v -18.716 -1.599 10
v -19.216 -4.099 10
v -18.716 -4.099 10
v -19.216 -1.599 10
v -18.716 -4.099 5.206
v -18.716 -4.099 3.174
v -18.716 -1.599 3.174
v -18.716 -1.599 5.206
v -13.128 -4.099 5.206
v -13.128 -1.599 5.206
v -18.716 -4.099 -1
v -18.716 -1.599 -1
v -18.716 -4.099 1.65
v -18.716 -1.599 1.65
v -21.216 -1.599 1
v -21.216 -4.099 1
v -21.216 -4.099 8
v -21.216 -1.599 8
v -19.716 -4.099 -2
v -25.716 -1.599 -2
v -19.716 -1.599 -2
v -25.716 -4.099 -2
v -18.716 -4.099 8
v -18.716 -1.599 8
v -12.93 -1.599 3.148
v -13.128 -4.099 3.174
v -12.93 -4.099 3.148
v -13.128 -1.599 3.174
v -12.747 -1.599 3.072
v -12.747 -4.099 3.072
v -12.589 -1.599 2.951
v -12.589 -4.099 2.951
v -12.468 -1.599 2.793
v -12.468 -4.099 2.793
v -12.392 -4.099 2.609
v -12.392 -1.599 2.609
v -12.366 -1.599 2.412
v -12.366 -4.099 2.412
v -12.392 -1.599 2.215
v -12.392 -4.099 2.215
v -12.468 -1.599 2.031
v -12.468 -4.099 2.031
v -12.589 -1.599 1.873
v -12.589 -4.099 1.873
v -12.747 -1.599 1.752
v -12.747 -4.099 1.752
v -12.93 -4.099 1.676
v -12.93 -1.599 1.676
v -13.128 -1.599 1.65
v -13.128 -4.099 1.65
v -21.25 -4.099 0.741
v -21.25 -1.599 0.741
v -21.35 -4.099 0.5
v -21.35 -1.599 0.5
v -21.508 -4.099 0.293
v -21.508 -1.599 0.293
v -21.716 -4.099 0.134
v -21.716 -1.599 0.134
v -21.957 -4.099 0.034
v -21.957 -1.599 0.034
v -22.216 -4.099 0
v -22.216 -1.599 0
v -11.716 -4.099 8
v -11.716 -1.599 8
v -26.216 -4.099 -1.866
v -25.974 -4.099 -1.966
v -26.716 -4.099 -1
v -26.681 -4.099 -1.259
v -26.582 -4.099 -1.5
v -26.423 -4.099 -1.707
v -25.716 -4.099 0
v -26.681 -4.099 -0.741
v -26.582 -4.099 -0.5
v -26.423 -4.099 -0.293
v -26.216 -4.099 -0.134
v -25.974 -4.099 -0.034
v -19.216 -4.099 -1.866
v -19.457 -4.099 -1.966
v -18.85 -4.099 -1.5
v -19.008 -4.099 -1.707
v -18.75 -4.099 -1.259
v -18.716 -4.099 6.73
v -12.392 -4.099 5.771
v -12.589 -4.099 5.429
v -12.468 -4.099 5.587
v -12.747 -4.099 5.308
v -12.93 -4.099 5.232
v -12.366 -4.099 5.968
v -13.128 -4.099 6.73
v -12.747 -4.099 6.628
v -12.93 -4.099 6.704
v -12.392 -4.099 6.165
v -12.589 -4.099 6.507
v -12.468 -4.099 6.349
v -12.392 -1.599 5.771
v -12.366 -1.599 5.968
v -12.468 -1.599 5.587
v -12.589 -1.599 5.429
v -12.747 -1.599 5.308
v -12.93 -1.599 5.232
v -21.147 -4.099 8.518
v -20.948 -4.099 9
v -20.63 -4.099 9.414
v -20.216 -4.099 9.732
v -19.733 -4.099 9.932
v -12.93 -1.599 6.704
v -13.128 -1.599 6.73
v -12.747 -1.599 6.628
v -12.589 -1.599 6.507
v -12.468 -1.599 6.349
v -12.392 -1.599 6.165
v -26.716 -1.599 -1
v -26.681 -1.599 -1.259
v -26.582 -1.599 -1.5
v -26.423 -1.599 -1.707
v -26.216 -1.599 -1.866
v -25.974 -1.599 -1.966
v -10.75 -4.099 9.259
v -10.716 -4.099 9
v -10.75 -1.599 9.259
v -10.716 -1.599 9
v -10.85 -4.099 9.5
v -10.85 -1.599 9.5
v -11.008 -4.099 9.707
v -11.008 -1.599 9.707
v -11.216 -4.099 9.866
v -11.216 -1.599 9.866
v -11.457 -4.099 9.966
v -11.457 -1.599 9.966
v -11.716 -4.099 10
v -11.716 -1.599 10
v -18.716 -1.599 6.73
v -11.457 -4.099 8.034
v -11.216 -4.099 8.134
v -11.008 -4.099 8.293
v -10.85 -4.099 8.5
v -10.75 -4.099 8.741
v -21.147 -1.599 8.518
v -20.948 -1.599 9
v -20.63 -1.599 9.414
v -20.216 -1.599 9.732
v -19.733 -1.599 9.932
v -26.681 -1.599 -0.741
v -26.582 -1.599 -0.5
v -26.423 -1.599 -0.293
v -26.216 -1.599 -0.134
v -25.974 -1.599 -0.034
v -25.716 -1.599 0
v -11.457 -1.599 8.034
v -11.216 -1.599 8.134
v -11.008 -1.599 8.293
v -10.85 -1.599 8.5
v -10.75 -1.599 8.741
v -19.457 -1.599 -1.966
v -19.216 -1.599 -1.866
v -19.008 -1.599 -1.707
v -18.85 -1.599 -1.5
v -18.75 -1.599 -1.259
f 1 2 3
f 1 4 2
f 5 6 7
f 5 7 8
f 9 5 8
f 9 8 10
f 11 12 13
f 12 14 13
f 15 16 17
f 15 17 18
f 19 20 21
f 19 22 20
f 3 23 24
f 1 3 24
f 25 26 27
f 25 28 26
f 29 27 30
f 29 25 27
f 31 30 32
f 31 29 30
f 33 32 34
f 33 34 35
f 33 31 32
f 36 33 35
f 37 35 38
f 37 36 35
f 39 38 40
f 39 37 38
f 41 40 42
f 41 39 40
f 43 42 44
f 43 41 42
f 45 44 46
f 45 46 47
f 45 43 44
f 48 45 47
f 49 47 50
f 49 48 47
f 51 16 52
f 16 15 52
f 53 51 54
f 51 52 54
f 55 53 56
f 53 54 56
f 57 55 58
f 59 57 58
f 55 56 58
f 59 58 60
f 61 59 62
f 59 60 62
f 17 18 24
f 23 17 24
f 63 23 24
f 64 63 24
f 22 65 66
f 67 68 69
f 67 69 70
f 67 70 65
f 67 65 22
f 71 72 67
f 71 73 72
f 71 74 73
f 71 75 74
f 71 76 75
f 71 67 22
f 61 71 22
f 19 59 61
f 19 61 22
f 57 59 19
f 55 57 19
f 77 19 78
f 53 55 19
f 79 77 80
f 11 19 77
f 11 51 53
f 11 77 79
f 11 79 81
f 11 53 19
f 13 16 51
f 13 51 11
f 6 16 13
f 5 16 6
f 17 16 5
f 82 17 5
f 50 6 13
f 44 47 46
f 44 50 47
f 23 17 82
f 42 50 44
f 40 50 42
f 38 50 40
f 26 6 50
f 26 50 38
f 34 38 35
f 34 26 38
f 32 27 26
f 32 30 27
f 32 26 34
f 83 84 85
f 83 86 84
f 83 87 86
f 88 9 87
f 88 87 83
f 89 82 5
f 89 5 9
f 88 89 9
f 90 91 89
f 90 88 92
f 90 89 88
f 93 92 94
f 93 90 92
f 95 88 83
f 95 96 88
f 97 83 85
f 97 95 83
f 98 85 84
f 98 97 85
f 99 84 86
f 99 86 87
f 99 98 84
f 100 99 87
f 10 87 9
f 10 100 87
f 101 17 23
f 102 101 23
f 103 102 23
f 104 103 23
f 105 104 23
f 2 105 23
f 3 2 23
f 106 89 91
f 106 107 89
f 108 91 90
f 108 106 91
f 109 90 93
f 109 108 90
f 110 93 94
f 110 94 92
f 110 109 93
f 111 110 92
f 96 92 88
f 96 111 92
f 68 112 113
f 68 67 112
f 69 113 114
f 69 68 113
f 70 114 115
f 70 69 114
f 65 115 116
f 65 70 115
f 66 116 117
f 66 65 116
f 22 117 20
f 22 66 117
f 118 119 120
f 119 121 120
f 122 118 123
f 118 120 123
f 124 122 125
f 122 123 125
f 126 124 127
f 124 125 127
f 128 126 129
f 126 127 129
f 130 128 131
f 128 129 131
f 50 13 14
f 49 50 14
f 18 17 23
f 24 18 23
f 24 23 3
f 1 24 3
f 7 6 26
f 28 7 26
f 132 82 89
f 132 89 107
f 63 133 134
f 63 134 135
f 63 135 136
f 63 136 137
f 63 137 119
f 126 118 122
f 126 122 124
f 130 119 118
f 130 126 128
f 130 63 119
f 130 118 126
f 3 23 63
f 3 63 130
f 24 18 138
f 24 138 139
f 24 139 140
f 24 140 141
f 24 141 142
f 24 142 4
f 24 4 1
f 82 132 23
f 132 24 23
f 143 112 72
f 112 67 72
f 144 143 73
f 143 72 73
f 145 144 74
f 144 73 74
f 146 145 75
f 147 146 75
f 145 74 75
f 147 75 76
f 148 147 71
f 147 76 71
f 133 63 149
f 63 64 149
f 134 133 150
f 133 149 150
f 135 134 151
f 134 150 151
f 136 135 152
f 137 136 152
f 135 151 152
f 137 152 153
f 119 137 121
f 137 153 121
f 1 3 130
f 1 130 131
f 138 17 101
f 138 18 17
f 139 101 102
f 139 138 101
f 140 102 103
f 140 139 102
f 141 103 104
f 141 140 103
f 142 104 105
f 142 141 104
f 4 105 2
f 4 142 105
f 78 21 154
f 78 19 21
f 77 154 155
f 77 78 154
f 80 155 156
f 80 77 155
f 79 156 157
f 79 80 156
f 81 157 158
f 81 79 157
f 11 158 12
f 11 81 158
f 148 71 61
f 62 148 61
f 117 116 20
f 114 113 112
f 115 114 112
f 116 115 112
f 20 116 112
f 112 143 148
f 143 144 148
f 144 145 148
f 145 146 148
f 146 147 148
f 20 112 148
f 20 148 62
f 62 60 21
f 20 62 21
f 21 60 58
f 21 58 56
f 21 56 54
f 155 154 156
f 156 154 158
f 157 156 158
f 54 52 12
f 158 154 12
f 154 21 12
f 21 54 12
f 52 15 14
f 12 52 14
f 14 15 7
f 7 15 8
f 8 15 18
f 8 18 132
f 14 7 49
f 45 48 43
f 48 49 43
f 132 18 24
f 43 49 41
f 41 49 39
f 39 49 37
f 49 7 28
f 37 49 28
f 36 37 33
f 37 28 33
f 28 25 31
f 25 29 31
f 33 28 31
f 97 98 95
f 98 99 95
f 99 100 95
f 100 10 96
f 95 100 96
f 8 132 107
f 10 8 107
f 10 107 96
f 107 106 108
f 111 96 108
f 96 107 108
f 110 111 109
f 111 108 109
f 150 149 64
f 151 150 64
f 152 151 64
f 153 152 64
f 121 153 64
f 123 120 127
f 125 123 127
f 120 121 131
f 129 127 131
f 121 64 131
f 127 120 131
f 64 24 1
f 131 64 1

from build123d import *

# Parameters (mm, degrees)
F0_W      = 2.5
F0_H      = 2.5
F1_DEPTH  = 10
F2_W      = 2.5
F2_H      = 2
F3_DEPTH  = 8
F4_W      = 2.5
F4_H      = 2
F5_DEPTH  = 2.5
F6_W      = 8
F6_H      = 2.5
F7_DEPTH  = 2
F8_R      = 0.99999
F9_W      = 2.5
F9_H      = 2.5
F10_DEPTH = 2
F11_R     = 1.99999
F12_W     = 2.5
F12_H     = 5.08
F13_DEPTH = 6.35
F14_W     = 6.35
F14_H     = 2.032
F15_DEPTH = 2.501
F16_R     = 0.76199


# Not quite as in the source:
# - a fillet or chamfer is up to 0.001 mm smaller than in the source, because OpenCascade refuses the exact size


with BuildPart() as f1:
    # F0 (on Top) → F1 (new body)
    with BuildSketch(Plane.XY):
        with Locations((-19.965537297, -2.8490219265)):
            Rectangle(F0_W, F0_H)
    extrude(amount=F1_DEPTH)

    # F2 (on face) → F3 (join)
    with BuildSketch(Plane.YZ.offset(-18.715537297)):
        with Locations((-2.8490219265, 9)):
            Rectangle(F2_W, F2_H)
    extrude(amount=F3_DEPTH)

    # F4 (on face) → F5 (cut, through all)
    with BuildSketch(Plane.XZ.offset(4.0990219265)):
        with Locations((-19.965537297, 9)):
            Rectangle(F4_W, F4_H)
    extrude(amount=-F5_DEPTH, mode=Mode.SUBTRACT)

    # F6 (on face) → F7 (join)
    with BuildSketch(Plane(origin=(0, 0, 0), x_dir=(1, 0, 0), z_dir=(0, 0, -1))):
        with Locations((-22.715537297, 2.8490219265)):
            Rectangle(F6_W, F6_H)
    extrude(amount=F7_DEPTH)

    # F8 (radius 1 in the source; OpenCascade refuses exactly that, so slightly less here)
    f8_edges = [f1.edges().sort_by_distance(p)[0] for p in [
        (-21.215537, -2.849022, 0),
        (-26.715537, -2.849022, 0),
        (-10.715537, -2.849022, 10),
        (-10.715537, -2.849022, 8),
        (-18.715537, -2.849022, -2),
        (-26.715537, -2.849022, -2),
    ]]
    fillet(f8_edges, radius=F8_R)

    # F12 (on face) → F13 (join)
    with BuildSketch(Plane.YZ.offset(-18.715537297)):
        with Locations((-2.8490219265, 4.19)):
            Rectangle(F12_W, F12_H)
    extrude(amount=F13_DEPTH)

    # F14 (on face) → F15 (cut, through all)
    with BuildSketch(Plane.XZ.offset(4.0990219265)):
        with Locations((-15.540537297, 4.19)):
            Rectangle(F14_W, F14_H)
    extrude(amount=-F15_DEPTH, mode=Mode.SUBTRACT)

    # F16 (radius 0.762 in the source; OpenCascade refuses exactly that, so slightly less here)
    f16_edges = [f1.edges().sort_by_distance(p)[0] for p in [
        (-12.365537, -2.849022, 6.73),
        (-12.365537, -2.849022, 5.206),
        (-12.365537, -2.849022, 3.174),
        (-12.365537, -2.849022, 1.65),
    ]]
    fillet(f16_edges, radius=F16_R)


with BuildPart() as f10:
    # F9 (on face) → F10 (new body, through all)
    with BuildSketch(Plane.XY.offset(8)):
        with Locations((-19.965537297, -2.8490219265)):
            Rectangle(F9_W, F9_H)
    extrude(amount=F10_DEPTH)

    # F11 (radius 2 in the source; OpenCascade refuses exactly that, so slightly less here)
    f11_edges = [f10.edges().sort_by_distance(p)[0] for p in [
        (-21.215537, -2.849022, 10),
    ]]
    fillet(f11_edges, radius=F11_R)


solid = Compound([f1.part, f10.part])
